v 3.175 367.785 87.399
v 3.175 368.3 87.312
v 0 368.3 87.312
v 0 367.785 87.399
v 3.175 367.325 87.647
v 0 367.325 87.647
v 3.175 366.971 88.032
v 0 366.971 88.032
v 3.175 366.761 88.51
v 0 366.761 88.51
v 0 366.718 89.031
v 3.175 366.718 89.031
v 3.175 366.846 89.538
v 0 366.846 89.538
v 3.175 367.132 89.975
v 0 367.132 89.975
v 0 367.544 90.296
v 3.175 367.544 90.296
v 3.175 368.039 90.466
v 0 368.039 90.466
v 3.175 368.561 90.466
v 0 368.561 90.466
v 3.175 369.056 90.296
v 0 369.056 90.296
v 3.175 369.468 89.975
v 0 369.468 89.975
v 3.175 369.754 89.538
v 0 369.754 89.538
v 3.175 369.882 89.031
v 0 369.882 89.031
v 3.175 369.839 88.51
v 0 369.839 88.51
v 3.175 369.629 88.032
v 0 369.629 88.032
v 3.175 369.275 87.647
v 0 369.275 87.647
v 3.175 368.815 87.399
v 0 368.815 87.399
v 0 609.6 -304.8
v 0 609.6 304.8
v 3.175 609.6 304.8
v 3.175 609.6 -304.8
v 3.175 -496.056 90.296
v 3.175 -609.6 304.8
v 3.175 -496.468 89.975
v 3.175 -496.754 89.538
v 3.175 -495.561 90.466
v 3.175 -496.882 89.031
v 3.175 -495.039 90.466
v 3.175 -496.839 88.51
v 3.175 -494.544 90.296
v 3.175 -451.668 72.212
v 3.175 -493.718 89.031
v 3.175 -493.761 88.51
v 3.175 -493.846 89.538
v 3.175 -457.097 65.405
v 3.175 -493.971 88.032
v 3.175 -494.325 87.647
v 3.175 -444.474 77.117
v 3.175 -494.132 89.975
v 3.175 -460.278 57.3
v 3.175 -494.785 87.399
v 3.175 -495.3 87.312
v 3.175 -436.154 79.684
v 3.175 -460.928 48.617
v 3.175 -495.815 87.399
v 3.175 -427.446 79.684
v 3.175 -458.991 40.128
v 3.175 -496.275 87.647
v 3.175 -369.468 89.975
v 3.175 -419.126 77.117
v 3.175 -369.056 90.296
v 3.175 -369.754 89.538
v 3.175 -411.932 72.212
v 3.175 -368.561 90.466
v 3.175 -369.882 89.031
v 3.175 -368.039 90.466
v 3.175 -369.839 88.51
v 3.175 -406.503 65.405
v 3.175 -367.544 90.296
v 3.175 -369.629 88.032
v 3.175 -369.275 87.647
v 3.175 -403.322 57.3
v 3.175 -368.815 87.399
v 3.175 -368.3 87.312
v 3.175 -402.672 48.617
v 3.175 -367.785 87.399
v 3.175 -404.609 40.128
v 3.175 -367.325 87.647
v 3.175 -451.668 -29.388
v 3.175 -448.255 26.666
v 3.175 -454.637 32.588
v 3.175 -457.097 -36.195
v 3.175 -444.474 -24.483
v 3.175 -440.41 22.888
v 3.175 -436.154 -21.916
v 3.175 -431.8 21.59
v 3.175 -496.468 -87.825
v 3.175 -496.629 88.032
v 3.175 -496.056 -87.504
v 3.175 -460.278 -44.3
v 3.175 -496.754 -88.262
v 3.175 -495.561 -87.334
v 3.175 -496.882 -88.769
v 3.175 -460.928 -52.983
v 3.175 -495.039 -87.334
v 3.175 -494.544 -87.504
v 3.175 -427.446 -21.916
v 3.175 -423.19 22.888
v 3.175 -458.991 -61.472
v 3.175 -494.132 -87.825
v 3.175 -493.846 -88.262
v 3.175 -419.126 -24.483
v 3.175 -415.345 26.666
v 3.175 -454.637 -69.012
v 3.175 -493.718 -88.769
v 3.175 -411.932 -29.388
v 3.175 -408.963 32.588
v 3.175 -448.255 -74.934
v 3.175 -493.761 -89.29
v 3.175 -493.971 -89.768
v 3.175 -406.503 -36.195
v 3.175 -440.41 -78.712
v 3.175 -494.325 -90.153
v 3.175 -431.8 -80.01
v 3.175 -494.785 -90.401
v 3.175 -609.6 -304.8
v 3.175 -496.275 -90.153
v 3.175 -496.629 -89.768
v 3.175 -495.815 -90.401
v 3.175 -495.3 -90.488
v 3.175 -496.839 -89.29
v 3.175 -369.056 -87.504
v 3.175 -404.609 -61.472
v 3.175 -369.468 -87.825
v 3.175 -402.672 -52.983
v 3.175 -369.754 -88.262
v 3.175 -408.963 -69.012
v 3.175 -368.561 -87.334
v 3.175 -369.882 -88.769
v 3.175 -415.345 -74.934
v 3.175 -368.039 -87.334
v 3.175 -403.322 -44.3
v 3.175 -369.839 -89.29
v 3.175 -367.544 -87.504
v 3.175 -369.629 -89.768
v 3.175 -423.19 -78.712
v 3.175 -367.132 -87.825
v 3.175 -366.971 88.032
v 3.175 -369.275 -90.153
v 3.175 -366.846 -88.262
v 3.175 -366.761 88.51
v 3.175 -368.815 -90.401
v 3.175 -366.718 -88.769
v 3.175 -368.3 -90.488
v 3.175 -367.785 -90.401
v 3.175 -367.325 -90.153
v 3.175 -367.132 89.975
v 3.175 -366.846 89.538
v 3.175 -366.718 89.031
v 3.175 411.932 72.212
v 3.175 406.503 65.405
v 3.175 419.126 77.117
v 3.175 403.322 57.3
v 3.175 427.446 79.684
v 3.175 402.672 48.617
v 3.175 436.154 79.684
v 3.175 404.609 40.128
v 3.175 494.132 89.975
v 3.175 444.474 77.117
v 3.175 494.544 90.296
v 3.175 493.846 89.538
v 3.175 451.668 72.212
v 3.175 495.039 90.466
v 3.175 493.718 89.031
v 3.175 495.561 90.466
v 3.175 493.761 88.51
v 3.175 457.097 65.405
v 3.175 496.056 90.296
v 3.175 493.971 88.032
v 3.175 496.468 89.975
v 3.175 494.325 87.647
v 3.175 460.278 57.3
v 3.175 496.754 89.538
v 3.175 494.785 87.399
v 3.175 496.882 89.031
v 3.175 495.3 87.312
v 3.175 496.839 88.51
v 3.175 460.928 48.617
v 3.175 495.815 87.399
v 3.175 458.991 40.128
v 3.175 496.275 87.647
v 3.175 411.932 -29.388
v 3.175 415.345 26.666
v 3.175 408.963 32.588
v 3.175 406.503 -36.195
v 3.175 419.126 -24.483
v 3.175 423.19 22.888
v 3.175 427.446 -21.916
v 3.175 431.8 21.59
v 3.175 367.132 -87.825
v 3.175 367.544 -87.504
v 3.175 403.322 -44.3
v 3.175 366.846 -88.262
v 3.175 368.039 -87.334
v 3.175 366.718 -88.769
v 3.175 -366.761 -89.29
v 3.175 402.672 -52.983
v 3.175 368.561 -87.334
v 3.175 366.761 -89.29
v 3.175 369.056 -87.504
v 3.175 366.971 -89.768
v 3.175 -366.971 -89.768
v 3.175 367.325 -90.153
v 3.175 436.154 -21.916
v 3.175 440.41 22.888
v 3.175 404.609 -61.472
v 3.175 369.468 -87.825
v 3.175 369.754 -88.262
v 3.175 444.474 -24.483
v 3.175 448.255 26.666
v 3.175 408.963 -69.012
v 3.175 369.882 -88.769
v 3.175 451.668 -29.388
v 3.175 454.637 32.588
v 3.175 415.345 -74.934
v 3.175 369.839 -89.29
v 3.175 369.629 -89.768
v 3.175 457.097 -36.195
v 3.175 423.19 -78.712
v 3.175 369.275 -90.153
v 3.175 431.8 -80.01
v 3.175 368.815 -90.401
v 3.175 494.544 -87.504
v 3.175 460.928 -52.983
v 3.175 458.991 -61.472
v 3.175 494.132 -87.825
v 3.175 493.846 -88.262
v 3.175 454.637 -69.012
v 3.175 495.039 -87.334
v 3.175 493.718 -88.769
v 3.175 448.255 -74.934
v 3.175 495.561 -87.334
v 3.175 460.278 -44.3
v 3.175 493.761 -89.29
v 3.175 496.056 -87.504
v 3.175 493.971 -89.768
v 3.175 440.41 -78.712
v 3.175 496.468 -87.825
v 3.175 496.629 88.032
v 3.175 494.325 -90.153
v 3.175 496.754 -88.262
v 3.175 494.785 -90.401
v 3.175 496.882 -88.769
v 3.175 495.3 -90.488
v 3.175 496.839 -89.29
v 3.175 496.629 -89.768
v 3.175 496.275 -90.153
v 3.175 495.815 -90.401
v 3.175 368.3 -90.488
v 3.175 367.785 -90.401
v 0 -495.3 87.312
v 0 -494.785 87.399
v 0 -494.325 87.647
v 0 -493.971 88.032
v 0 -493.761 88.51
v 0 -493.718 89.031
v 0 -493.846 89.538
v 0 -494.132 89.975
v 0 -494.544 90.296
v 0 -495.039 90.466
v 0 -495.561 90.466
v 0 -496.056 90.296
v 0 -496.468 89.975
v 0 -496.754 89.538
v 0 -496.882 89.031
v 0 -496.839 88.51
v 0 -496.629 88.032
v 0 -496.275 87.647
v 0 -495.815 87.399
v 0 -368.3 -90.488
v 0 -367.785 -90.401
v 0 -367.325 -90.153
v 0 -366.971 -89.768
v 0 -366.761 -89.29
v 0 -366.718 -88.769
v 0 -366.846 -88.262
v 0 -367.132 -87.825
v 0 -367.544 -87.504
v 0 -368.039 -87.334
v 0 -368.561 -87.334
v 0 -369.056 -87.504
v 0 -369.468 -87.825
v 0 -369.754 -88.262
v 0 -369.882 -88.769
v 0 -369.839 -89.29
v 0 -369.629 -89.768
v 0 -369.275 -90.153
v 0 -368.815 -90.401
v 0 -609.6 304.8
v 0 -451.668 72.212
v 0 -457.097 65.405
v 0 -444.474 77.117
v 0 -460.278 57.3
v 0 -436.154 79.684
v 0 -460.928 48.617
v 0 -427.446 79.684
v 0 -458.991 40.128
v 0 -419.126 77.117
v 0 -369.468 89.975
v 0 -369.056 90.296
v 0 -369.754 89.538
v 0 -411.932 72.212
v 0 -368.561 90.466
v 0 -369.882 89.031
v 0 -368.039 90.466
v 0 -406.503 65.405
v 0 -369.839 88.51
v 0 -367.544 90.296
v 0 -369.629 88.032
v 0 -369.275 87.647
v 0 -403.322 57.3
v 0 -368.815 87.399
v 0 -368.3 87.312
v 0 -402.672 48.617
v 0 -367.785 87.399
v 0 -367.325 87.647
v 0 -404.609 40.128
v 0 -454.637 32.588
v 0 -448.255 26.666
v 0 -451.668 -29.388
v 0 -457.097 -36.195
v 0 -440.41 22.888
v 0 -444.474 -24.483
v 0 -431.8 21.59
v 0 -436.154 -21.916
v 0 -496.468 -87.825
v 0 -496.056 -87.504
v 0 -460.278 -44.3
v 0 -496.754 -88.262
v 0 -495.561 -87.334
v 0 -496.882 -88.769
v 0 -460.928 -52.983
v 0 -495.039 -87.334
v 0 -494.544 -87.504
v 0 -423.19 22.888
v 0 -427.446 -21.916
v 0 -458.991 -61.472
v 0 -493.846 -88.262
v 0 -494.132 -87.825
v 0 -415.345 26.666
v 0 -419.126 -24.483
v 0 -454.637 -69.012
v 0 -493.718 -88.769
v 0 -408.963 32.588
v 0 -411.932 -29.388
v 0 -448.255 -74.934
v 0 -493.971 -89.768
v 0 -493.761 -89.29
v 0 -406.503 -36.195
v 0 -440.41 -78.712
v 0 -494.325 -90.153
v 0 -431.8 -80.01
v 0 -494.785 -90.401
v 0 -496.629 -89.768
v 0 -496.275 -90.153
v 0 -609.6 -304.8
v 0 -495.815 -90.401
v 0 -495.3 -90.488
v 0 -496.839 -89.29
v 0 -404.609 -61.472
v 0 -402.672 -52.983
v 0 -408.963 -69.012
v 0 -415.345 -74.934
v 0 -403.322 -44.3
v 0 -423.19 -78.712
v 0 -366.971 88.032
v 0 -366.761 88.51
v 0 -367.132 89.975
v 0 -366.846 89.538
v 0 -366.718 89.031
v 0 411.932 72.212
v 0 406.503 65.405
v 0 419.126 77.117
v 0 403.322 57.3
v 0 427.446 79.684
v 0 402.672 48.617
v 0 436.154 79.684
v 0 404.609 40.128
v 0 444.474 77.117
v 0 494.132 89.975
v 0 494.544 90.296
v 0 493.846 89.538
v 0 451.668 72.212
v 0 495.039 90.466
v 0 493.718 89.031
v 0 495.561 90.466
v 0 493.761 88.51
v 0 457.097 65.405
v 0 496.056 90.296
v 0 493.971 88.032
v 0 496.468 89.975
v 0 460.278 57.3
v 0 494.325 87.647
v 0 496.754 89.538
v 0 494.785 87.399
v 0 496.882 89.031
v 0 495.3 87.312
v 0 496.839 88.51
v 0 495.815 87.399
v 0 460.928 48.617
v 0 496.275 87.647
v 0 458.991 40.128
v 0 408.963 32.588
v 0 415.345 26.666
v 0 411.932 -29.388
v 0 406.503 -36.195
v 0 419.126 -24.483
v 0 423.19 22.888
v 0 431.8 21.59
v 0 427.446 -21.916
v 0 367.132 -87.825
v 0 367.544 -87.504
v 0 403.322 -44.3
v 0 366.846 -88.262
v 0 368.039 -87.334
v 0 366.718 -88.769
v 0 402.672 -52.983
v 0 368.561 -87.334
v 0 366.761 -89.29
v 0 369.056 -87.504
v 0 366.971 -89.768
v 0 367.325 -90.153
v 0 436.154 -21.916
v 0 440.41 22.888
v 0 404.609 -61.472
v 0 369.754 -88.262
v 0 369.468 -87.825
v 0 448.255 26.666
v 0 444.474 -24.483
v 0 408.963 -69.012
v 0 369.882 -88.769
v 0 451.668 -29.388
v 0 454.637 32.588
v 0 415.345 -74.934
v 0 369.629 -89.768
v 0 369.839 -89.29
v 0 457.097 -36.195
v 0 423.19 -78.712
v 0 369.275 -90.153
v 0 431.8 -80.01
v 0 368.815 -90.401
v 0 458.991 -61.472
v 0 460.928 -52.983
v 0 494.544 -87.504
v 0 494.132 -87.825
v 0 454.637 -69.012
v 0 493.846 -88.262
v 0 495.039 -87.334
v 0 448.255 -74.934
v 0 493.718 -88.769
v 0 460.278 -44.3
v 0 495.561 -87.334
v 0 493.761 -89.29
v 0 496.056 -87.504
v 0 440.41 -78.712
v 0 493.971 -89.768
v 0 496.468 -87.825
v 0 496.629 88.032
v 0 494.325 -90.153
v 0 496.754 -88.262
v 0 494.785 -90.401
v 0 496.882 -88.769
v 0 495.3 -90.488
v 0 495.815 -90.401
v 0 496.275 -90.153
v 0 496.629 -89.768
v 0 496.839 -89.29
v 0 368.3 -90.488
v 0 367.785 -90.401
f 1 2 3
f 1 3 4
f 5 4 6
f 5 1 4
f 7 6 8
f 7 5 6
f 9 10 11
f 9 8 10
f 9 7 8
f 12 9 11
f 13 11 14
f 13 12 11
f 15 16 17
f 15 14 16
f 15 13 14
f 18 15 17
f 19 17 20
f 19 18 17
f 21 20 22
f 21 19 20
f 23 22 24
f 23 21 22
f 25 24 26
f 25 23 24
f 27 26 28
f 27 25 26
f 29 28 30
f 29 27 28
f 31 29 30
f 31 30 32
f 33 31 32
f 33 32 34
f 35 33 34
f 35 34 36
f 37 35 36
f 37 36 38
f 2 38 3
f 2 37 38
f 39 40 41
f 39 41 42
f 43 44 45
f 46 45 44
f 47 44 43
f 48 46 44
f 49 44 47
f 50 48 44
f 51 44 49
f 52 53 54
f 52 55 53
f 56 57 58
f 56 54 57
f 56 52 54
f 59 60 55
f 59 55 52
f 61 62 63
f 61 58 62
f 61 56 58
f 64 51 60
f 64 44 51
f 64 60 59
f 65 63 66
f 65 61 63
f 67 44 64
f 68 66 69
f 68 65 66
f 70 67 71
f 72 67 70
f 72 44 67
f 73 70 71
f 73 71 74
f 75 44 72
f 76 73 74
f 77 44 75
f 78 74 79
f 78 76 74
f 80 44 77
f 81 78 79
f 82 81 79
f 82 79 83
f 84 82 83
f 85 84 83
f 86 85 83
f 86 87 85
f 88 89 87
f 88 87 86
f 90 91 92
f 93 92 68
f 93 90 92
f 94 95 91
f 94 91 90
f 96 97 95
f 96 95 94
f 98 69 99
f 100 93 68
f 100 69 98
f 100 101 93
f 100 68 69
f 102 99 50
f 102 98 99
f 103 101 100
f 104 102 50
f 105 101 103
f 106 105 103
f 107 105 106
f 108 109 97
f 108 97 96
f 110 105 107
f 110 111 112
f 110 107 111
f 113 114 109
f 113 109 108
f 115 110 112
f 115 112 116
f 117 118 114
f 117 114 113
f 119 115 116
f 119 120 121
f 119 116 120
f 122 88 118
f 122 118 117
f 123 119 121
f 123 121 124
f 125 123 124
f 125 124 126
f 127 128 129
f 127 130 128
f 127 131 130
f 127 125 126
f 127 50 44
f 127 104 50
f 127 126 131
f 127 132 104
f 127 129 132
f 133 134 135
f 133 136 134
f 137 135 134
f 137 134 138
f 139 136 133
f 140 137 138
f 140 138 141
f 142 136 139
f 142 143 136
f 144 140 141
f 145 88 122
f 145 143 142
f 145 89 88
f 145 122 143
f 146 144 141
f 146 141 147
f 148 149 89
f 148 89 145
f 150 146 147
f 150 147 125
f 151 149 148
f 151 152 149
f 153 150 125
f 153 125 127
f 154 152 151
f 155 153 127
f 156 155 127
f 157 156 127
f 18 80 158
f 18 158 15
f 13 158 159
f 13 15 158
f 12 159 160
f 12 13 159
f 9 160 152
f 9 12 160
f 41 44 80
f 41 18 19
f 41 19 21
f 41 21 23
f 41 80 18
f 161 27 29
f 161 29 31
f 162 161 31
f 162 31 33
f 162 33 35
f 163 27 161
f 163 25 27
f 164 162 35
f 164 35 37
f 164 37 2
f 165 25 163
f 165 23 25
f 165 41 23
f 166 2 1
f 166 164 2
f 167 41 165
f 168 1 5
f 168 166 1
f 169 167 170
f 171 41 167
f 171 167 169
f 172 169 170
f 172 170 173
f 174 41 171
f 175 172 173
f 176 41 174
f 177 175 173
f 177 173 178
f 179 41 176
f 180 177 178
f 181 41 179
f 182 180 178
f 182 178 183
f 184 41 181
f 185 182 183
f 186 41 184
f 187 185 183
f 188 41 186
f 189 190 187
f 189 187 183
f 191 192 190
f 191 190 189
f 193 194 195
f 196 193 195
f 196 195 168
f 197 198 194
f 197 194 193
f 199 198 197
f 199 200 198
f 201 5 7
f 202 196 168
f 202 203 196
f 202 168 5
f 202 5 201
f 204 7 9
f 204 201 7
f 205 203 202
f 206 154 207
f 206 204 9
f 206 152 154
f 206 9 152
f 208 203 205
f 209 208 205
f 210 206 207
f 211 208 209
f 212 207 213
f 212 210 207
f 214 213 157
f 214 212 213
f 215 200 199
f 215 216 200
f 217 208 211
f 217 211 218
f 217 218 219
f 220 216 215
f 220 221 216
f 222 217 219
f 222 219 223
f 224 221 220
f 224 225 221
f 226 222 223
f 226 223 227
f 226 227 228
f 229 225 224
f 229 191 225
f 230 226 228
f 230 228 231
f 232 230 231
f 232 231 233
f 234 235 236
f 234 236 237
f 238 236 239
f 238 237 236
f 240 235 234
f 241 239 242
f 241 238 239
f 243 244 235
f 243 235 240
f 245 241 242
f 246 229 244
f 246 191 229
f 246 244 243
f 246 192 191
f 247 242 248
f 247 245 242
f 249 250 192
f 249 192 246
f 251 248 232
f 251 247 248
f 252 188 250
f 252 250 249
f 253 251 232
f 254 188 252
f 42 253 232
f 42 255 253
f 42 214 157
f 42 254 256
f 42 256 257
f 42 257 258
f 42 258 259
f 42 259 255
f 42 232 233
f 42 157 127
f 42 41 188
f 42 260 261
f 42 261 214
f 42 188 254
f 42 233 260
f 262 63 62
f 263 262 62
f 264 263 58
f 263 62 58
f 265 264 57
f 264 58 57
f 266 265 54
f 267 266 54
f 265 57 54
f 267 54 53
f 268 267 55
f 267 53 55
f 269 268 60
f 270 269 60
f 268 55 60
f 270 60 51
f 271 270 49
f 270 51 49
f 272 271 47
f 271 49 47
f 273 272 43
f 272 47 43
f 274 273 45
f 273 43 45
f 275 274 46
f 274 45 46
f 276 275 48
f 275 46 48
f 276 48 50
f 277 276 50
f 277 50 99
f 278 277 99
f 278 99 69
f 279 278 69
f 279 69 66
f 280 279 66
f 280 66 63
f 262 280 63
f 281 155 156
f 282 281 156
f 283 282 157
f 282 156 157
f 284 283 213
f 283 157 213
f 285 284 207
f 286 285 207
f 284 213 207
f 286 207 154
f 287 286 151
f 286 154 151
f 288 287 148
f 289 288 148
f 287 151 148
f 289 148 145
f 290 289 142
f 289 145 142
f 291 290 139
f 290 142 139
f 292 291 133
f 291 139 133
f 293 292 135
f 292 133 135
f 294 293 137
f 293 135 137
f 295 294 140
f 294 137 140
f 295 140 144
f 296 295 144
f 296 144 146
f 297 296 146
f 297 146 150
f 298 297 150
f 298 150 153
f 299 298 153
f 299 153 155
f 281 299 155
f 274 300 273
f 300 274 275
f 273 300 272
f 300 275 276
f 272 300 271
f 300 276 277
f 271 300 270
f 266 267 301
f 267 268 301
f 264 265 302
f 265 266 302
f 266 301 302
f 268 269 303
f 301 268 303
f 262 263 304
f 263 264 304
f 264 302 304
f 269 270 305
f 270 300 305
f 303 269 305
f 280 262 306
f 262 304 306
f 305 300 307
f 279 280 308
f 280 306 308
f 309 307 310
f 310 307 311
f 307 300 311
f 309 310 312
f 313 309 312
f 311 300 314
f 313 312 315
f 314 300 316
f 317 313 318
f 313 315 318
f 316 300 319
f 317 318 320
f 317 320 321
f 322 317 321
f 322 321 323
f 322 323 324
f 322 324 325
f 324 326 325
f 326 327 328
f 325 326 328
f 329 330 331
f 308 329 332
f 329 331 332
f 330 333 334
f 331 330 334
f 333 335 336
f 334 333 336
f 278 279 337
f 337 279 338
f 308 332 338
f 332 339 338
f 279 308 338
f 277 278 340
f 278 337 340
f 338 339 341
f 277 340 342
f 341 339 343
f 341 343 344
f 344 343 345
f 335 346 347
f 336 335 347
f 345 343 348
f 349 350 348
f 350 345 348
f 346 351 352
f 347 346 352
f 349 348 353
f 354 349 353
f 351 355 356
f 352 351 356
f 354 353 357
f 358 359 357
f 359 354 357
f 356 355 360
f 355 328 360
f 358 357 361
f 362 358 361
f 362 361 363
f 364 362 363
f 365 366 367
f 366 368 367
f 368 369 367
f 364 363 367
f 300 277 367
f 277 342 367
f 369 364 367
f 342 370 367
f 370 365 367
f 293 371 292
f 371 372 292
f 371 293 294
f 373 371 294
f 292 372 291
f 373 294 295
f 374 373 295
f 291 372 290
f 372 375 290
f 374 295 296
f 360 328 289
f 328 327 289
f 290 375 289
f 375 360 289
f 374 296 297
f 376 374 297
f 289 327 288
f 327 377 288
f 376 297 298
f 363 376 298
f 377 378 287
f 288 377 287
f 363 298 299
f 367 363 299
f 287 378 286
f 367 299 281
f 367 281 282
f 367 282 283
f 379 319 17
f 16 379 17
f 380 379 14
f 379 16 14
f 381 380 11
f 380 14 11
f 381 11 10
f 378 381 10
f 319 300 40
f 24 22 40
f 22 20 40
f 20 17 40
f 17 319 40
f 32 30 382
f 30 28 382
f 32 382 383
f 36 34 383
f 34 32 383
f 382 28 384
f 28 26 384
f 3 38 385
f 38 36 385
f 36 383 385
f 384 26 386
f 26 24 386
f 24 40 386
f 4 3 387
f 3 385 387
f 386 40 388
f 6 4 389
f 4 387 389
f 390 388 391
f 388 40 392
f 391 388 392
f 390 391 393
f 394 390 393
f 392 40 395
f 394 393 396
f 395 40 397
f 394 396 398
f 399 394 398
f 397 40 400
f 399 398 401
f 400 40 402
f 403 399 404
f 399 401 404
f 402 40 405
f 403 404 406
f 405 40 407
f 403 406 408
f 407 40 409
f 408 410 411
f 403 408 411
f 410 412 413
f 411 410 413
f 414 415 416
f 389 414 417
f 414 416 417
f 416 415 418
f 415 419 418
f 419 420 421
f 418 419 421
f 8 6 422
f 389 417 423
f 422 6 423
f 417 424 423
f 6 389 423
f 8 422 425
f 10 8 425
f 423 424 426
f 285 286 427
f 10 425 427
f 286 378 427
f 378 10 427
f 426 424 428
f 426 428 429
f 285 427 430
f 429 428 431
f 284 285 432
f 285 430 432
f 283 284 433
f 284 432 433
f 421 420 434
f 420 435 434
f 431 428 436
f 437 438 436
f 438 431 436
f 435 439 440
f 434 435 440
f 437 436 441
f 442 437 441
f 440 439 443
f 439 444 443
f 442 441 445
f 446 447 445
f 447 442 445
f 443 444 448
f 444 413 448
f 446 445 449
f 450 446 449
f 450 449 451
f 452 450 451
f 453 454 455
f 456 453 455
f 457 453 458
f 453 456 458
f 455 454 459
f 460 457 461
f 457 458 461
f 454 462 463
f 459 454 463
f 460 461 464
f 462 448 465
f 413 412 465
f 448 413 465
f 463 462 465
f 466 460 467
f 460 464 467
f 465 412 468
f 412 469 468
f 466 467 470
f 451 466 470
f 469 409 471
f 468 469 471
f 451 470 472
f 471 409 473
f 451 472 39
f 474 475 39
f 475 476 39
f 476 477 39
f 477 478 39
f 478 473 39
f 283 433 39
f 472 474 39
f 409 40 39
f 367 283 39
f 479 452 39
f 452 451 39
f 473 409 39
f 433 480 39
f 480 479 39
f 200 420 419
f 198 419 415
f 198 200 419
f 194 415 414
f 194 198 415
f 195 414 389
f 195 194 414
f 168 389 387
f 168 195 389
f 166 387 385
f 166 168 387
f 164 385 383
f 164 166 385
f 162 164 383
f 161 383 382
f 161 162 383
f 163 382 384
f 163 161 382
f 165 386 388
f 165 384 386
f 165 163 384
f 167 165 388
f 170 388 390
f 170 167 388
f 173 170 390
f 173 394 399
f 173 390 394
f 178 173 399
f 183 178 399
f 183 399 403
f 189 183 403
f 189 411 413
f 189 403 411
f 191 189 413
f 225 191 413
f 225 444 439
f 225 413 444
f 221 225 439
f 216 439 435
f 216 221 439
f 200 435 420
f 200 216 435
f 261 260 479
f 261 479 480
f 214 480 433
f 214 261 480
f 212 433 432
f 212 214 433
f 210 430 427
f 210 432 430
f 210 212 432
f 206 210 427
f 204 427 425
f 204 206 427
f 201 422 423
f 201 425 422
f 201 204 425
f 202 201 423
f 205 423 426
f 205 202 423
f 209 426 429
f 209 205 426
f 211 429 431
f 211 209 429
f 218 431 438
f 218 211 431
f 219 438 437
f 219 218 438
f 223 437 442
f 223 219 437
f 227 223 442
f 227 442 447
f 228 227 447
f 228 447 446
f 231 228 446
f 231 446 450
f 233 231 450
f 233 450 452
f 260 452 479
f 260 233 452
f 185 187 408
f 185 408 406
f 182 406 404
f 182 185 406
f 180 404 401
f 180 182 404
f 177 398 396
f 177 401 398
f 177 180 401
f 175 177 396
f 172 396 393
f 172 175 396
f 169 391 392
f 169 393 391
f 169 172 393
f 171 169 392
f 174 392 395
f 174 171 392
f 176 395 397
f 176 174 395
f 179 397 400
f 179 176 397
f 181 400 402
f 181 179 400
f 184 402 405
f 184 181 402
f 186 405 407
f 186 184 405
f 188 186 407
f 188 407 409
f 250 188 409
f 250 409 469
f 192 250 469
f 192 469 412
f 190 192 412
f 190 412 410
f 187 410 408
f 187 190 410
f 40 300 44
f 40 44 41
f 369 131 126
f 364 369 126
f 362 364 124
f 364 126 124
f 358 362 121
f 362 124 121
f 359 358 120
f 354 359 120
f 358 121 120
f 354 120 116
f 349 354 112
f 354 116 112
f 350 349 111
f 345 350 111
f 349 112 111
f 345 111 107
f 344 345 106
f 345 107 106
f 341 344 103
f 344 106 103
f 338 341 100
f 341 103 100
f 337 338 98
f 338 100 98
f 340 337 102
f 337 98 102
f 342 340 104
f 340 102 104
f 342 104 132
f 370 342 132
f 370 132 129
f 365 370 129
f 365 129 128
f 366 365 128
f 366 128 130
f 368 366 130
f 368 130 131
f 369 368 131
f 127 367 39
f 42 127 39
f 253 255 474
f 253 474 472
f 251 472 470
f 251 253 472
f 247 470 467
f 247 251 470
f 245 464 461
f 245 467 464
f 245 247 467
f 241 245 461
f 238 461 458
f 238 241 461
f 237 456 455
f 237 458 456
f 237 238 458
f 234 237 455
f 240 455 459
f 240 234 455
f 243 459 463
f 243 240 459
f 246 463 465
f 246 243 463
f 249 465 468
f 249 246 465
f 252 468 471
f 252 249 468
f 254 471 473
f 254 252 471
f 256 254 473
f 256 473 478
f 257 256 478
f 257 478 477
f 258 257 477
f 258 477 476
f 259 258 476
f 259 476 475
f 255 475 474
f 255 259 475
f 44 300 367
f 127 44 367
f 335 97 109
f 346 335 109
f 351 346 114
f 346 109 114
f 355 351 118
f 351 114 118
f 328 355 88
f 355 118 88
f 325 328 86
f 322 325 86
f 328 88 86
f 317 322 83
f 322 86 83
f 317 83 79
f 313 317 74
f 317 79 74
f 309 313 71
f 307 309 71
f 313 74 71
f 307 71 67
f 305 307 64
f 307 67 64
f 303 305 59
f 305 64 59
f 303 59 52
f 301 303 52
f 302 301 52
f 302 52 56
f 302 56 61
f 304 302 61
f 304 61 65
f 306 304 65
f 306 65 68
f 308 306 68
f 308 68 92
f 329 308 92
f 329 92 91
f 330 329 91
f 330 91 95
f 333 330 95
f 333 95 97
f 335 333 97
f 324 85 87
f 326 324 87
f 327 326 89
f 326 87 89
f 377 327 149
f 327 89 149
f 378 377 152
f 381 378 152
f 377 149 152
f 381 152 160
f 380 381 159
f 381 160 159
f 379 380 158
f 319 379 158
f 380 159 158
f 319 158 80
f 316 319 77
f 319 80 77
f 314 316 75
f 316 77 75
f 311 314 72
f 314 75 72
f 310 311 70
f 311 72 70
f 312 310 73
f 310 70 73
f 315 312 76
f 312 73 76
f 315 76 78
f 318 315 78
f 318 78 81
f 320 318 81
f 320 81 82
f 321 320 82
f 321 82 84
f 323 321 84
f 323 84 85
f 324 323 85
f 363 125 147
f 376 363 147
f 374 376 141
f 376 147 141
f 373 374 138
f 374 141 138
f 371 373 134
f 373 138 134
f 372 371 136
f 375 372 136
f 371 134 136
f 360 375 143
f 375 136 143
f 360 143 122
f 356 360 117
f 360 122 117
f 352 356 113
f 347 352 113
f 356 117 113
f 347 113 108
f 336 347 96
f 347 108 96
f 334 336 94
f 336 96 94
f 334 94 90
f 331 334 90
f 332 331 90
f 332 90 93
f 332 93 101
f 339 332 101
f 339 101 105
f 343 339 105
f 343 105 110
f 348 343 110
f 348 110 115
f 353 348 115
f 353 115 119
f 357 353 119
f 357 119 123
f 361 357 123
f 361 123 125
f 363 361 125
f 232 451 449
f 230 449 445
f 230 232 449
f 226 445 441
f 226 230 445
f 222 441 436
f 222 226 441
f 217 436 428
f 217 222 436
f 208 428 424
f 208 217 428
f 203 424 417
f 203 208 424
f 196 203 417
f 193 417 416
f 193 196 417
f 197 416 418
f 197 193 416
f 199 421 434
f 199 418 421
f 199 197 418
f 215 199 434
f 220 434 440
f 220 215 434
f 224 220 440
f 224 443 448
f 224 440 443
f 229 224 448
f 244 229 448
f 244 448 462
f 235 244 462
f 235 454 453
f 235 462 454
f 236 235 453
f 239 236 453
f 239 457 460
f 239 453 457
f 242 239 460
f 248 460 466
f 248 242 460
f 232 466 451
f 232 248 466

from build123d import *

# Parameters (mm, degrees)
SKETCH1_W           = 609.6
SKETCH1_H           = 1219.2
BOSS_EXTRUDE1_DEPTH = 3.175
SKETCH2_R           = 29.21
CUT_EXTRUDE1_DEPTH  = 682.560914831
SKETCH3_R           = 1.5875
CUT_EXTRUDE2_DEPTH  = 682.560914831


with BuildPart() as part:
    # Sketch1 → Boss-Extrude1 (new body)
    with BuildSketch(Plane(origin=(0, 0, 0), x_dir=(0, 0, -1), z_dir=(1, 0, 0))):
        Rectangle(SKETCH1_W, SKETCH1_H)
    extrude(amount=BOSS_EXTRUDE1_DEPTH)

    # Sketch2 → Cut-Extrude1 (cut, through all)
    with BuildSketch(Plane(origin=(3.175, 0, 0), x_dir=(0, 0, -1), z_dir=(1, 0, 0))):
        with Locations((-50.8, -431.8)):
            Circle(SKETCH2_R)
        with Locations((50.8, -431.8)):
            Circle(SKETCH2_R)
    cut_extrude1 = extrude(amount=-CUT_EXTRUDE1_DEPTH, mode=Mode.SUBTRACT)

    # Sketch3 → Cut-Extrude2 (cut, through all)
    with BuildSketch(Plane(origin=(3.175, 0, 0), x_dir=(0, 0, -1), z_dir=(1, 0, 0))):
        with Locations((-88.9, -368.3)):
            Circle(SKETCH3_R)
        with Locations((88.9, -368.3)):
            Circle(SKETCH3_R)
        with Locations((-88.9, -495.3)):
            Circle(SKETCH3_R)
        with Locations((88.9, -495.3)):
            Circle(SKETCH3_R)
    cut_extrude2 = extrude(amount=-CUT_EXTRUDE2_DEPTH, mode=Mode.SUBTRACT)

    # Mirror1: Cut-Extrude1, Cut-Extrude2 across plane
    add(cut_extrude1.mirror(Plane.ZX), mode=Mode.SUBTRACT)
    add(cut_extrude2.mirror(Plane.ZX), mode=Mode.SUBTRACT)


solid = part.part
